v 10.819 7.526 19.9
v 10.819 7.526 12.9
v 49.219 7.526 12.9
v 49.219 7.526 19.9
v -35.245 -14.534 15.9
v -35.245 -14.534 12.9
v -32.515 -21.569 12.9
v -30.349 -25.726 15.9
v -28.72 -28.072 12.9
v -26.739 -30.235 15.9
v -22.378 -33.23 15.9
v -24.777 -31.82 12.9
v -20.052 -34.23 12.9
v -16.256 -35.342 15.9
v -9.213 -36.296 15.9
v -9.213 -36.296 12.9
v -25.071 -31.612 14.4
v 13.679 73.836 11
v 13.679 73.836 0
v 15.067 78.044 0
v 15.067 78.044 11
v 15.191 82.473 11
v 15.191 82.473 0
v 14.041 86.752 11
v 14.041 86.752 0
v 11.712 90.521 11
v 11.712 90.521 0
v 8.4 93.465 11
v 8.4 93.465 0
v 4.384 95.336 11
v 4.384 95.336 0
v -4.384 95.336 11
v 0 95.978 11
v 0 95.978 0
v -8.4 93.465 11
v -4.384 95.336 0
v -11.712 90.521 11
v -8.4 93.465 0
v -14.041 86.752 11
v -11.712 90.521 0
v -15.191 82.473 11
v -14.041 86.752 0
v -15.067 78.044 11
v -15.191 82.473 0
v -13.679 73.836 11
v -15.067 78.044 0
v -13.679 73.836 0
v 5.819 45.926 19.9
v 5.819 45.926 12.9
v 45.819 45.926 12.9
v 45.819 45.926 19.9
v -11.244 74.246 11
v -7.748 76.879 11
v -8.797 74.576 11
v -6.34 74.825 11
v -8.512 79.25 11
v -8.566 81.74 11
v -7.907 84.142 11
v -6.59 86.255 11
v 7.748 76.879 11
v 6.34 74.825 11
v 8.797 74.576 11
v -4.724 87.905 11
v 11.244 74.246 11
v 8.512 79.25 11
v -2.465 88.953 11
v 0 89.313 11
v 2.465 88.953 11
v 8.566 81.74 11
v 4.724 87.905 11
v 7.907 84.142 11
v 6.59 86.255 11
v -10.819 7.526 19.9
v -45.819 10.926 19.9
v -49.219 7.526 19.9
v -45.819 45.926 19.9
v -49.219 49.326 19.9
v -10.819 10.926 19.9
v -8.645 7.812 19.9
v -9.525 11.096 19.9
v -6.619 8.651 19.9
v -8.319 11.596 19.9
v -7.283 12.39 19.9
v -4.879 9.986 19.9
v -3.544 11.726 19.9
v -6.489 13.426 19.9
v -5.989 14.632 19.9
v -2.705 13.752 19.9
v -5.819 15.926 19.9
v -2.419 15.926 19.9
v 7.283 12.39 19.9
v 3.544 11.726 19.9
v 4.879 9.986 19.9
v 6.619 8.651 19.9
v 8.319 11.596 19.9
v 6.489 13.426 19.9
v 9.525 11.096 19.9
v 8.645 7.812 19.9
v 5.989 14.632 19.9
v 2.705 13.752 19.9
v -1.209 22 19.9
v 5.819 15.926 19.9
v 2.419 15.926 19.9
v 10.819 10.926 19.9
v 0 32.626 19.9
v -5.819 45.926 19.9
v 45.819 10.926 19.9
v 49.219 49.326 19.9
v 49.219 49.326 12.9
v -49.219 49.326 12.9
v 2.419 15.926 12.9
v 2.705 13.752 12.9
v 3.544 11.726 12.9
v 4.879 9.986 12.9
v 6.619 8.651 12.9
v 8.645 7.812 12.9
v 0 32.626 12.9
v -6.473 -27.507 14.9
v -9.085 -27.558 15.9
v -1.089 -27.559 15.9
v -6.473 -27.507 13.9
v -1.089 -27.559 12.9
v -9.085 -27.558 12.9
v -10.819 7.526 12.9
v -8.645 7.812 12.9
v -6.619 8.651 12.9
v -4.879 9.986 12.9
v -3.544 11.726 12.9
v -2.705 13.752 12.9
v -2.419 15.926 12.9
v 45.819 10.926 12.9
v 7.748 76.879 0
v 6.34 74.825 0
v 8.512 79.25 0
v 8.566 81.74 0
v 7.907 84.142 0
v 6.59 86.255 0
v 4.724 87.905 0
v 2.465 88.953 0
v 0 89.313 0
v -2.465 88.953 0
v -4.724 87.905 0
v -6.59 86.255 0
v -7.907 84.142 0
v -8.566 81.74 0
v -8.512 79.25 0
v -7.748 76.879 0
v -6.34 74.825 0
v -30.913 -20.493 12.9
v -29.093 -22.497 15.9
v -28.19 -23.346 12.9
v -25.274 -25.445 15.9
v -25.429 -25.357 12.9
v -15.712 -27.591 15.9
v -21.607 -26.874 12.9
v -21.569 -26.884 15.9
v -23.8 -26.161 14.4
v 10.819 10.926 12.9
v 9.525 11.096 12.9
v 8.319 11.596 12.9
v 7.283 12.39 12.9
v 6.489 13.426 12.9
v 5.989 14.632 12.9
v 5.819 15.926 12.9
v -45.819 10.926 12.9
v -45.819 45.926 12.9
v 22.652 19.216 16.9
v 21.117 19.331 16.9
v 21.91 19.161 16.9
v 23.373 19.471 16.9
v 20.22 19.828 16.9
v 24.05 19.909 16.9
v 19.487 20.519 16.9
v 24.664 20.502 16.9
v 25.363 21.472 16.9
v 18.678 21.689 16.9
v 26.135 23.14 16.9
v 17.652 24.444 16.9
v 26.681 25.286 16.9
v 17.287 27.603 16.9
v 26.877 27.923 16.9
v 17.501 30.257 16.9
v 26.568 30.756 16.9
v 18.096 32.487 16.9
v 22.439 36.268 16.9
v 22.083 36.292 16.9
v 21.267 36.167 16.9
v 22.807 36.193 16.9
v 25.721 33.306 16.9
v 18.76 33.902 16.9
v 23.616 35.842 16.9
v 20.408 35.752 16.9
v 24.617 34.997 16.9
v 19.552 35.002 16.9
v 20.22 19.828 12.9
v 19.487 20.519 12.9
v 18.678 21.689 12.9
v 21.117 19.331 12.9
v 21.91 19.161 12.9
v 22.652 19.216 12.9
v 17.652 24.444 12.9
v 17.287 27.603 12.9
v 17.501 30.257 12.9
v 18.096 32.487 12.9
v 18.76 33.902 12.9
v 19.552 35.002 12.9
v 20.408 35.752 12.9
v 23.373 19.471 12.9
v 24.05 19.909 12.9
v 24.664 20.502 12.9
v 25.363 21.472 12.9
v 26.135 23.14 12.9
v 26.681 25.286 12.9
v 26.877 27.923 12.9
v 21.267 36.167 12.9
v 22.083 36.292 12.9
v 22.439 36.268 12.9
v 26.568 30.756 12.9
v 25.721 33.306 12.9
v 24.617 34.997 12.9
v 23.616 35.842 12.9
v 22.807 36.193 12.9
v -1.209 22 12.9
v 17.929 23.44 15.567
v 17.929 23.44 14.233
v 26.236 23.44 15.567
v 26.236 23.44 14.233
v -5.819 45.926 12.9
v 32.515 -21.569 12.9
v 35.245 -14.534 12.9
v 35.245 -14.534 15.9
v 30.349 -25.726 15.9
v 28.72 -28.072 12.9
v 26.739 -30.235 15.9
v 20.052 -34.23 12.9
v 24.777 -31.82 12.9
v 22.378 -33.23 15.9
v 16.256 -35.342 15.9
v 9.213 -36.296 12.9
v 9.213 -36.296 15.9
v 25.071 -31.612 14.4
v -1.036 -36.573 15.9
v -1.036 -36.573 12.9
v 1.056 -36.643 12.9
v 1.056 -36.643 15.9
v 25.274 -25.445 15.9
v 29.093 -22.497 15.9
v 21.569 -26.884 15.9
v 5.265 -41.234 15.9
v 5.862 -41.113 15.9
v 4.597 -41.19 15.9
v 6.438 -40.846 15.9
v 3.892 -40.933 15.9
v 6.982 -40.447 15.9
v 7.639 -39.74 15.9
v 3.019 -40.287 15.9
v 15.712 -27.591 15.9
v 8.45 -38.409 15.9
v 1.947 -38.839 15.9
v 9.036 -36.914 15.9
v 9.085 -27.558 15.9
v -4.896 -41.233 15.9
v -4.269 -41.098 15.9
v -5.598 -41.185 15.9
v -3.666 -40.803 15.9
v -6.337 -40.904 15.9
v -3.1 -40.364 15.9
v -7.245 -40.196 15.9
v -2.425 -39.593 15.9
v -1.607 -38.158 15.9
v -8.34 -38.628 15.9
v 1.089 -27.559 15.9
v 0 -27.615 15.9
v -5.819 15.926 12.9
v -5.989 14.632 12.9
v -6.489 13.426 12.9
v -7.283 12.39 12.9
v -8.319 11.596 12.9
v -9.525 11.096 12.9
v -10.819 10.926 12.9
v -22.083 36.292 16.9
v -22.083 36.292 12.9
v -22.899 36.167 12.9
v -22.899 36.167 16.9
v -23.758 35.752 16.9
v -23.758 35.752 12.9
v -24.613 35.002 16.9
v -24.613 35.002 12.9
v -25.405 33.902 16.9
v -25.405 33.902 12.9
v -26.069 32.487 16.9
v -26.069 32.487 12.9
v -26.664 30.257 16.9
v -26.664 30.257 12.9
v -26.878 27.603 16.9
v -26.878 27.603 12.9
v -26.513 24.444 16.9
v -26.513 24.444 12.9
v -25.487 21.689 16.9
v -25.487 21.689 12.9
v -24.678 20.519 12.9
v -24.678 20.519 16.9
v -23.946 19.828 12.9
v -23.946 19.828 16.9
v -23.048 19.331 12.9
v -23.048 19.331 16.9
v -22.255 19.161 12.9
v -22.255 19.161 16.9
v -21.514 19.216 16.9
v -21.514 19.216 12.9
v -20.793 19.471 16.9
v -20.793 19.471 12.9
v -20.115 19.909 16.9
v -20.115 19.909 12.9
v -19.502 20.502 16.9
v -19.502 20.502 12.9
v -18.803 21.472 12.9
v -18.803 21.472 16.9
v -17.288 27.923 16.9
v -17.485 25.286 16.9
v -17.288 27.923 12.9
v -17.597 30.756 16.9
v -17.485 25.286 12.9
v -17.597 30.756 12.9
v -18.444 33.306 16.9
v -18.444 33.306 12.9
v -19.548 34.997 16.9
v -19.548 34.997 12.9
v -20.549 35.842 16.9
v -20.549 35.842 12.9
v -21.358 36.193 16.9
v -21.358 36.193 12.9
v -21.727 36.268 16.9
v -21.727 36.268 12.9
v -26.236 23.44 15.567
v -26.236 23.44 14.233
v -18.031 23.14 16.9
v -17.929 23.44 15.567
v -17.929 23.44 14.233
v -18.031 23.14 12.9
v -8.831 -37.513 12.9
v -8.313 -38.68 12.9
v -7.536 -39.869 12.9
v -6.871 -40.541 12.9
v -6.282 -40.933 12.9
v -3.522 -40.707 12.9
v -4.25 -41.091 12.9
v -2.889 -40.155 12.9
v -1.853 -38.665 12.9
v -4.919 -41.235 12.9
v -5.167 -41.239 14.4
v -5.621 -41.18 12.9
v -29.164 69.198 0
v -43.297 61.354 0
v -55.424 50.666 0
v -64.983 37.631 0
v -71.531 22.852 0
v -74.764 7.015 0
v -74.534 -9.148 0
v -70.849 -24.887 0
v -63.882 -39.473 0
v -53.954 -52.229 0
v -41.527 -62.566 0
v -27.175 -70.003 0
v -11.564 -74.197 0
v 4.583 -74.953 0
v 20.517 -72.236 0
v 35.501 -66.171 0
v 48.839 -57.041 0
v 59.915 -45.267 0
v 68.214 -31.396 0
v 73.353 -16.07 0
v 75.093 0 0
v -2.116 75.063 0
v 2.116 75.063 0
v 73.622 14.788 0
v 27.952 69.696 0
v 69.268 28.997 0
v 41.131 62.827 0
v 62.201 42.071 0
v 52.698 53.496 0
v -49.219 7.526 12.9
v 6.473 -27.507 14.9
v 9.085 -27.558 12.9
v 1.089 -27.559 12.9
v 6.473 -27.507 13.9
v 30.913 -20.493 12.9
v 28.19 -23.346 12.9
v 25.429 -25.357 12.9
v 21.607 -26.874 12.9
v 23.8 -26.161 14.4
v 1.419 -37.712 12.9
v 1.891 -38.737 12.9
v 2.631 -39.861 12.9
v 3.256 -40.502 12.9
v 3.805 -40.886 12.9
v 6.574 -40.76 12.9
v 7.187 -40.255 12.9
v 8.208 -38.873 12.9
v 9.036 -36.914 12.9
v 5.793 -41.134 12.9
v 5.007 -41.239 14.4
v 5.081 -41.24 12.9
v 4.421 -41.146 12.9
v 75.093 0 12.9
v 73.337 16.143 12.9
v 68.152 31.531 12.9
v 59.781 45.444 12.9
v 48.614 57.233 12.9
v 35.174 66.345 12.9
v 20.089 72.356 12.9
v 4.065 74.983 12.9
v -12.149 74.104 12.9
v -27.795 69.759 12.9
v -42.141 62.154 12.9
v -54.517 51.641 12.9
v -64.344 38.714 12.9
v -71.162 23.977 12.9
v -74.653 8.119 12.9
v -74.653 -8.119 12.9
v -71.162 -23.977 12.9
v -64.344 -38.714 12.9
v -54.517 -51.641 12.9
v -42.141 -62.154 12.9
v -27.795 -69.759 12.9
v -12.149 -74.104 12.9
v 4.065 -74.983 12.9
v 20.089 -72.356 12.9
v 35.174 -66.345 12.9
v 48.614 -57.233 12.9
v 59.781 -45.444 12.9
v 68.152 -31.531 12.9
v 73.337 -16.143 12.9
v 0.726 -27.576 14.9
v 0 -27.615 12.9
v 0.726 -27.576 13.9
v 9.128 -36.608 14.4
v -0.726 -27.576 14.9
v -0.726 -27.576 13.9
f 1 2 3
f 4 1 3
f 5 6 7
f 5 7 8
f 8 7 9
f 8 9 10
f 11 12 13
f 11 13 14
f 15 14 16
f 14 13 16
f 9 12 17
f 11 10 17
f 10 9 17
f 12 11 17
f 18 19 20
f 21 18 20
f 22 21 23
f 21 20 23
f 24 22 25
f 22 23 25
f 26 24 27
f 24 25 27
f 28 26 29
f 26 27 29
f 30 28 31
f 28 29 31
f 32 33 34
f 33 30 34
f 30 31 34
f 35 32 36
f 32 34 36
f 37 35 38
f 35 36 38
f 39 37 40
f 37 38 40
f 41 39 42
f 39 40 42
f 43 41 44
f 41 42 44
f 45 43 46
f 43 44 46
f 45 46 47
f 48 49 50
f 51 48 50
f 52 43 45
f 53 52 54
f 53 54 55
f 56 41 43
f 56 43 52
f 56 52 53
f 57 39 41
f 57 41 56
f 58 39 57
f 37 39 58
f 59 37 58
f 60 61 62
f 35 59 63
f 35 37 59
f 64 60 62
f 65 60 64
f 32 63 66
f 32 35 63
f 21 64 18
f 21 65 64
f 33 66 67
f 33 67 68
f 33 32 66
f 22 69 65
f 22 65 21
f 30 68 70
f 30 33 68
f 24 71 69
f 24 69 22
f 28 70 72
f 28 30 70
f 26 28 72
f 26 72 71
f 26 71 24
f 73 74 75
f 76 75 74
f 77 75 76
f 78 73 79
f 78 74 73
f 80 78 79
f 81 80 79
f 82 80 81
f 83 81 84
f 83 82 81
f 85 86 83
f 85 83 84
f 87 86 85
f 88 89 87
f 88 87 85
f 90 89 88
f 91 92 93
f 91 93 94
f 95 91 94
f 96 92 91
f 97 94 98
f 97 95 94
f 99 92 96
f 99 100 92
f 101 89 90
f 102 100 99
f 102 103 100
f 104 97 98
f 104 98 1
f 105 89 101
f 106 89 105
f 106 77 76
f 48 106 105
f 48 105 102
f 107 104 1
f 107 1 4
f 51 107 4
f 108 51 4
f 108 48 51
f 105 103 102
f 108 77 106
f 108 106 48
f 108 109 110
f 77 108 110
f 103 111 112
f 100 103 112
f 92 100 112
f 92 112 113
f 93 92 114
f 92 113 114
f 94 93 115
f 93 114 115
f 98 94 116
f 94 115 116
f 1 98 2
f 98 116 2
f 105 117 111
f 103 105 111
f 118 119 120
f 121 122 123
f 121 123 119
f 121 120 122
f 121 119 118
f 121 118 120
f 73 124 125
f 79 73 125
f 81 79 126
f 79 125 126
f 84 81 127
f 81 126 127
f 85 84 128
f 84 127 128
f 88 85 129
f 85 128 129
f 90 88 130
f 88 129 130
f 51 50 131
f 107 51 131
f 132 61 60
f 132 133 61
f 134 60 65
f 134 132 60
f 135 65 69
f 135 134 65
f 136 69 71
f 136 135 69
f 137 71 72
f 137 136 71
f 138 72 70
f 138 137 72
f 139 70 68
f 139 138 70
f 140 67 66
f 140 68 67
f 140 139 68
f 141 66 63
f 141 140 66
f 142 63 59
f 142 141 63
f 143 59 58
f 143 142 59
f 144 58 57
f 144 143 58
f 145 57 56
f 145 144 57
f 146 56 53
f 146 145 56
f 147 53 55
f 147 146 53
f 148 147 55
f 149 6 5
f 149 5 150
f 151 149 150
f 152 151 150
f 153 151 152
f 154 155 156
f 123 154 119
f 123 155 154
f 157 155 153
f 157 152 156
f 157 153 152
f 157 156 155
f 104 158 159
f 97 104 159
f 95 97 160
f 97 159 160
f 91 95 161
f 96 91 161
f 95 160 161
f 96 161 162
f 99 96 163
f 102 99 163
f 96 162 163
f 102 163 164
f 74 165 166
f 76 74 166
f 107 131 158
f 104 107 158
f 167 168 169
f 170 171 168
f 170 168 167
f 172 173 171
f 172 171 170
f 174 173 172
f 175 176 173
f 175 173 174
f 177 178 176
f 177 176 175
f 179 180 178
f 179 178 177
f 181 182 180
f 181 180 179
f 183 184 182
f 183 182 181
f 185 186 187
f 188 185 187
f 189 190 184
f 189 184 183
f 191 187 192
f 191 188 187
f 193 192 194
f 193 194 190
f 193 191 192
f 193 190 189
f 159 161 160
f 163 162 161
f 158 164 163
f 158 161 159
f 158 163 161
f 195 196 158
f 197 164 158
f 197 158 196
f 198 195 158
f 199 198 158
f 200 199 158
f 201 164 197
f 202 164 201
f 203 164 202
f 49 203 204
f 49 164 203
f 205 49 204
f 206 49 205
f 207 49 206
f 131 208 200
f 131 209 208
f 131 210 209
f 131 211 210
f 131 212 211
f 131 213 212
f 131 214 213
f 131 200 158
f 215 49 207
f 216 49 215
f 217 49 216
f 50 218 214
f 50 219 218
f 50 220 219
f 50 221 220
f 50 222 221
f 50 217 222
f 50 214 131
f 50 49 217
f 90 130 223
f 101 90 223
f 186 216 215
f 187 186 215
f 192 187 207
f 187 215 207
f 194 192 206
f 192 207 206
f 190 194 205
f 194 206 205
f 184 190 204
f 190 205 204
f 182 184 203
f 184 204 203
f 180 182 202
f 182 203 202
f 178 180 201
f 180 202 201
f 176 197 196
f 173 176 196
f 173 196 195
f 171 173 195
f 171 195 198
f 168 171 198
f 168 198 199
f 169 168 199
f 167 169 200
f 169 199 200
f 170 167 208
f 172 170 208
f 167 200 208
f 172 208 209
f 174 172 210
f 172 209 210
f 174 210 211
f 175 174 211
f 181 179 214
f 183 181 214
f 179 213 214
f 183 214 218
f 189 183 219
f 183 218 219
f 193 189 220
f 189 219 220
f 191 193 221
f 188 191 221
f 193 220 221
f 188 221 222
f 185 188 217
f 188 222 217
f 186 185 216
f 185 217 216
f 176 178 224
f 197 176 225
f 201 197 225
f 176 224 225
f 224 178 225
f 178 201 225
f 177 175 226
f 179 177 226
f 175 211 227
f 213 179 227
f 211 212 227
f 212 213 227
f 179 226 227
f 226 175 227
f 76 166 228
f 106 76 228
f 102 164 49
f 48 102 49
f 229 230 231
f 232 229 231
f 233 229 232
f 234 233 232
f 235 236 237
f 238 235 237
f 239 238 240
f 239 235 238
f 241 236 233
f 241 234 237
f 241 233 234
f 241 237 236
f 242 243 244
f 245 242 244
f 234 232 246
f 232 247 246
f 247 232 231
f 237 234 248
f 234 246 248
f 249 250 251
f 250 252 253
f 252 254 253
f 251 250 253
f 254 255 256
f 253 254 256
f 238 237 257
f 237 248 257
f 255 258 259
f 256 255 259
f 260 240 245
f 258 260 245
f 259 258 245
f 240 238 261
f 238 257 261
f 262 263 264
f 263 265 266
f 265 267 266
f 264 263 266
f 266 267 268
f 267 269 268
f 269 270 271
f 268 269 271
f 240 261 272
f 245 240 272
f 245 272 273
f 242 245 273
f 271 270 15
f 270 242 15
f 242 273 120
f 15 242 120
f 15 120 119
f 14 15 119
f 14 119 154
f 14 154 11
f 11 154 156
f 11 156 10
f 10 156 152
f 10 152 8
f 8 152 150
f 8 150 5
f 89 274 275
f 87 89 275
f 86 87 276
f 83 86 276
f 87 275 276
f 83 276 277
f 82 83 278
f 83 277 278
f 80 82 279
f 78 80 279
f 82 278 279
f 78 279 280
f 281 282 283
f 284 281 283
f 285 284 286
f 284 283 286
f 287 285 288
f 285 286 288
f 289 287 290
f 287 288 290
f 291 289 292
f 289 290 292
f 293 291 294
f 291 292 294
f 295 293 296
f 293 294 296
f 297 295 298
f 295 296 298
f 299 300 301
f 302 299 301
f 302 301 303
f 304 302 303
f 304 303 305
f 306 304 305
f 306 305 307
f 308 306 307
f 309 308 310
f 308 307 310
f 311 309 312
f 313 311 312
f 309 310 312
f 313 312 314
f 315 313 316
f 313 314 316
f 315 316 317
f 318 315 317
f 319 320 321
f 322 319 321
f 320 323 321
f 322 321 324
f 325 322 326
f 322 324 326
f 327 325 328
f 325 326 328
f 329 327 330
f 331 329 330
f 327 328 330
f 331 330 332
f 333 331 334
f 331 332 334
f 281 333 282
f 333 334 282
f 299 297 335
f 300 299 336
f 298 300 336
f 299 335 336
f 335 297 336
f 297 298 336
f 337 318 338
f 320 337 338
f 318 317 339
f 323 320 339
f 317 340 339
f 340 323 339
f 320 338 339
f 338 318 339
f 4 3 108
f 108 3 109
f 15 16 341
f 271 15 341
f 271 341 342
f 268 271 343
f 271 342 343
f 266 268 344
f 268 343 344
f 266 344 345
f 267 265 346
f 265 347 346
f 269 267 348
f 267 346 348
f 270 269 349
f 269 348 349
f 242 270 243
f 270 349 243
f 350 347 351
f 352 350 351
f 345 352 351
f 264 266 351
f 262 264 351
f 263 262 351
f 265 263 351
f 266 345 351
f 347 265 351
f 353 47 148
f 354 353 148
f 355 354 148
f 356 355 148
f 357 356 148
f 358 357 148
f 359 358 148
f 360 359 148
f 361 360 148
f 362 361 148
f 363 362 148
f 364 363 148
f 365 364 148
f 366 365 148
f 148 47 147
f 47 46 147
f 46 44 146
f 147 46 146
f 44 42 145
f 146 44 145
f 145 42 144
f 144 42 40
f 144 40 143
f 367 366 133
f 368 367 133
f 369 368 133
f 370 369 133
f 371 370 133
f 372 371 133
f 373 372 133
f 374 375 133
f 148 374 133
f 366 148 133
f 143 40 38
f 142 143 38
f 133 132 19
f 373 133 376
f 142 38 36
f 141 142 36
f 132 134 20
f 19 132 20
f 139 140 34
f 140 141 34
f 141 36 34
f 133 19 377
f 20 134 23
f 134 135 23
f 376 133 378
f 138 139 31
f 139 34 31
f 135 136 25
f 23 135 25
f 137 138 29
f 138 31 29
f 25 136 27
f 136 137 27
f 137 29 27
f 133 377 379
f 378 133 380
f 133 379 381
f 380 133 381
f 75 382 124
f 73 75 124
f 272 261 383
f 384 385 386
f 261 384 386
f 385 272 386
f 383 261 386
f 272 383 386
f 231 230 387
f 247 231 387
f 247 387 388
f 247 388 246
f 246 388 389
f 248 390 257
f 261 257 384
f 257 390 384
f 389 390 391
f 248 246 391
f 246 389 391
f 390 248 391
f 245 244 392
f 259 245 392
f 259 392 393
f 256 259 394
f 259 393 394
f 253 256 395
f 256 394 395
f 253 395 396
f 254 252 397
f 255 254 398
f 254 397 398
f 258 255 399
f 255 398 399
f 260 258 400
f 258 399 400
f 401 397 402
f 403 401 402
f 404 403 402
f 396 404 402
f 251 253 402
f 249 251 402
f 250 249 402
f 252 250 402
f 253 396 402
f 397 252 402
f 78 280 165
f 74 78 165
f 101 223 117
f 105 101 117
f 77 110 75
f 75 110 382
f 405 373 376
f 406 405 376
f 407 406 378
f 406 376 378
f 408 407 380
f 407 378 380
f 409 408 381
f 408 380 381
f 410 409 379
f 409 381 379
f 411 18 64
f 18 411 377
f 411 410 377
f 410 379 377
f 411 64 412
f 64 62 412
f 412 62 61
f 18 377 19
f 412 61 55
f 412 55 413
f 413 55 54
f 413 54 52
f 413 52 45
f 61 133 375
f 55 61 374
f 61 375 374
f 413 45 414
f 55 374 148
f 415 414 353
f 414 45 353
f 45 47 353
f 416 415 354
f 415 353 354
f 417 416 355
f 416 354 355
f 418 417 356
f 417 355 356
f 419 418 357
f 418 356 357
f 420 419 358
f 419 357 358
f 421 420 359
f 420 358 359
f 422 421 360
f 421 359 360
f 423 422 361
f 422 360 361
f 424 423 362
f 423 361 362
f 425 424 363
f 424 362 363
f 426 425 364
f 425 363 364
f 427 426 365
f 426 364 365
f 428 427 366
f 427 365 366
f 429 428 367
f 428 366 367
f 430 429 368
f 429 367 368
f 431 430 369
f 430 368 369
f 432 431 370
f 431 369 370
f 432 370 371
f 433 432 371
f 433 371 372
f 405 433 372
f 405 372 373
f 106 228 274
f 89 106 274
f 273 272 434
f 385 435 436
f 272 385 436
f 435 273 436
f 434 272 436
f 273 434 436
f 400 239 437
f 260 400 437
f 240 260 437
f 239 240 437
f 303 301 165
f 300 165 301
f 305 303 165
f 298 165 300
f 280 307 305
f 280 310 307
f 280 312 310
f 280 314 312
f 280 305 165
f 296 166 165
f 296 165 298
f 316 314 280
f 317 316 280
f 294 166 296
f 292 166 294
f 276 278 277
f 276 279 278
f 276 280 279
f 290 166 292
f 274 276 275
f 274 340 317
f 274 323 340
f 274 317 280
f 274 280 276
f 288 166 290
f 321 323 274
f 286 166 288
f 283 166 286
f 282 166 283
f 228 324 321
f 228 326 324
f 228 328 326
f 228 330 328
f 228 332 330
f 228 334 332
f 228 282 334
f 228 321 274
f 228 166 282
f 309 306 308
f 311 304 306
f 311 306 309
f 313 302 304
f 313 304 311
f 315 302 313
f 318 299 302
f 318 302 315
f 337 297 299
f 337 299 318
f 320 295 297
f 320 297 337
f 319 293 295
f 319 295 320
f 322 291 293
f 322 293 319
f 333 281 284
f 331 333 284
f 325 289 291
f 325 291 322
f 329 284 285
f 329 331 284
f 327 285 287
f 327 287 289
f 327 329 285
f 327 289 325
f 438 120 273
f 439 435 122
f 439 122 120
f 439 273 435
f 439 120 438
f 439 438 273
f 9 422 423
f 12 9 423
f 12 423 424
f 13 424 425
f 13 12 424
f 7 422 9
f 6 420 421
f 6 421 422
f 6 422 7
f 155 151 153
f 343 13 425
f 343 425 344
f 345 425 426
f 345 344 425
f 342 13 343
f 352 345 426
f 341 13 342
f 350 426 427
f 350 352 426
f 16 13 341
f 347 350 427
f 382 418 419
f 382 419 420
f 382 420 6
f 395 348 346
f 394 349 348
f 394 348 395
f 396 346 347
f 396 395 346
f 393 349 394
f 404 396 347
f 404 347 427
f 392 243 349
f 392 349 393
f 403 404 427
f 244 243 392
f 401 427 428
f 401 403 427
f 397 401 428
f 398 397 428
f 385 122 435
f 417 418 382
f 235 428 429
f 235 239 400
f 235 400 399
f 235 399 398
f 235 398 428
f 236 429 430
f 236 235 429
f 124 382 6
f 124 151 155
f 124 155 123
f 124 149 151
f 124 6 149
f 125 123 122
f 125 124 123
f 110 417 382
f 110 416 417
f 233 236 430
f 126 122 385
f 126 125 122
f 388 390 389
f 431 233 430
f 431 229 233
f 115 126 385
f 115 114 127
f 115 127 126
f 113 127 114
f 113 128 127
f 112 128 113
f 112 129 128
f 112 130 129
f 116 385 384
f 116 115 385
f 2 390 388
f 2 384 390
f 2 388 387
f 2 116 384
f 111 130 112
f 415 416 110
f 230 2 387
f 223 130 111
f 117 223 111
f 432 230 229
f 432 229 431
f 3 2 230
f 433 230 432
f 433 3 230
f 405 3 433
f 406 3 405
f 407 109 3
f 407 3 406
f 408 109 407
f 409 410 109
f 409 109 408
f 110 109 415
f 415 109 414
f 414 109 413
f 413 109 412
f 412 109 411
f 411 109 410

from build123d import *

# Parameters (mm, degrees)
F0_R     = 75.0928281094
F2_DEPTH = 12.9
F3_DEPTH = 15.9
F5_DEPTH = 4
F6_R     = 15.2965579627
F6_R_2   = 8.6311016996
F7_DEPTH = 11
F9_DEPTH = 7


with BuildPart() as f2:
    # F0 (on Top) → F2 (new body)
    with BuildSketch(Plane.XY):
        Circle(F0_R)
    extrude(amount=F2_DEPTH)

    # F1 (on face) → F3 (join)
    with BuildSketch(Plane.XY):
        with BuildLine():
            add(Edge.make_bspline(
                [(-35.2451838553, -14.5340962335), (-32.0518207836, -19.1964482892), (-26.2372639575, -27.9738789108), (-14.7014562583, -27.6842216687), (-9.08471609, -27.5584450171)],
                knots=[0, 0, 0, 0, 0.4527149803, 0.8127890997, 0.8127890997, 0.8127890997, 0.8127890997], degree=3))
            add(Edge.make_bspline(
                [(-35.2451838553, -14.5340962335), (-32.8115077506, -21.3914317712), (-28.4404924532, -32.6892135381), (-15.405757475, -35.9303240461), (-9.2133200428, -36.2957460358)],
                knots=[0, 0, 0, 0, 0.4690101989, 0.827322276, 0.827322276, 0.827322276, 0.827322276], degree=3))
            add(Edge.make_bspline(
                [(-9.08471609, -27.5584450171), (-10.3725503531, -31.8579406773), (-9.2133200428, -36.2957460358)],
                knots=[1.0400212004, 1.0400212004, 1.0400212004, 2.0439012187, 2.0439012187, 2.0439012187], degree=2, weights=[1, 0.8766508211, 1]))
        make_face()
        with BuildLine():
            add(Edge.make_bspline(
                [(-9.08471609, -27.5584450171), (-10.3725503531, -31.8579406773), (-9.2133200428, -36.2957460358)],
                knots=[1.0400212004, 1.0400212004, 1.0400212004, 2.0439012187, 2.0439012187, 2.0439012187], degree=2, weights=[1, 0.8766508211, 1]))
            add(Edge.make_bspline(
                [(-9.2133200428, -36.2957460358), (-6.5297495568, -36.4541062417), (-3.7434296225, -36.417470813), (-0.9420935331, -36.2243297496)],
                knots=[0.827322276, 0.827322276, 0.827322276, 0.827322276, 0.9826013119, 0.9826013119, 0.9826013119, 0.9826013119], degree=3))
            add(Edge.make_bspline(
                [(-0.9420935331, -36.2243297496), (0.1851268686, -31.8136655998), (-1.0889131788, -27.559237201)],
                knots=[4.2480963919, 4.2480963919, 4.2480963919, 5.2430629887, 5.2430629887, 5.2430629887], degree=2, weights=[1, 0.8787863524, 1]))
            add(Edge.make_bspline(
                [(-9.08471609, -27.5584450171), (-6.5062543312, -27.5007050689), (-3.8211027643, -27.4435013669), (-1.0889131788, -27.559237201)],
                knots=[0.8127890997, 0.8127890997, 0.8127890997, 0.8127890997, 0.9780873545, 0.9780873545, 0.9780873545, 0.9780873545], degree=3))
        make_face()
        with BuildLine():
            add(Edge.make_bspline(
                [(-9.2133200428, -36.2957460358), (-6.5297495568, -36.4541062417), (-3.7434296225, -36.417470813), (-0.9420935331, -36.2243297496)],
                knots=[0.827322276, 0.827322276, 0.827322276, 0.827322276, 0.9826013119, 0.9826013119, 0.9826013119, 0.9826013119], degree=3))
            add(Edge.make_bspline(
                [(-9.2133200428, -36.2957460358), (-5.2569763, -51.441557274), (-1.035979555, -36.5726214568)],
                knots=[2.0439012187, 2.0439012187, 2.0439012187, 4.204730432, 4.204730432, 4.204730432], degree=2, weights=[1, 0.4709626581, 1]))
            add(Edge.make_bspline(
                [(-1.035979555, -36.5726214568), (-0.9871093073, -36.4004705121), (-0.9420935331, -36.2243297496)],
                knots=[4.204730432, 4.204730432, 4.204730432, 4.2480963919, 4.2480963919, 4.2480963919], degree=2, weights=[1, 0.9997649334, 1]))
        make_face()
        with BuildLine():
            add(Edge.make_bspline(
                [(-0.9420935331, -36.2243297496), (0.1851268686, -31.8136655998), (-1.0889131788, -27.559237201)],
                knots=[4.2480963919, 4.2480963919, 4.2480963919, 5.2430629887, 5.2430629887, 5.2430629887], degree=2, weights=[1, 0.8787863524, 1]))
            add(Edge.make_bspline(
                [(-0.9420935331, -36.2243297496), (-0.6282097401, -36.2026887014), (-0.3141374234, -36.1790827672), (0, -36.1535660923)],
                knots=[0.9826013119, 0.9826013119, 0.9826013119, 0.9826013119, 1, 1, 1, 1], degree=3))
            add(Edge.make_bspline(
                [(0.9420935331, -36.2243297496), (0.6282097401, -36.2026887014), (0.3141374234, -36.1790827672), (0, -36.1535660923)],
                knots=[0.9826013119, 0.9826013119, 0.9826013119, 0.9826013119, 1, 1, 1, 1], degree=3))
            add(Edge.make_bspline(
                [(1.0889131788, -27.559237201), (-0.1851268686, -31.8136655998), (0.9420935331, -36.2243297496)],
                knots=[1.0401223185, 1.0401223185, 1.0401223185, 2.0350889153, 2.0350889153, 2.0350889153], degree=2, weights=[1, 0.8787863524, 1]))
            add(Edge.make_bspline(
                [(1.0889131788, -27.559237201), (0.7267224105, -27.5745796394), (0.3637050295, -27.5929611946), (0, -27.6147834957)],
                knots=[0.9780873545, 0.9780873545, 0.9780873545, 0.9780873545, 1, 1, 1, 1], degree=3))
            add(Edge.make_bspline(
                [(-1.0889131788, -27.559237201), (-0.7267224105, -27.5745796394), (-0.3637050295, -27.5929611946), (0, -27.6147834957)],
                knots=[0.9780873545, 0.9780873545, 0.9780873545, 0.9780873545, 1, 1, 1, 1], degree=3))
        make_face()
        with BuildLine():
            add(Edge.make_bspline(
                [(-0.9420935331, -36.2243297496), (-0.6282097401, -36.2026887014), (-0.3141374234, -36.1790827672), (0, -36.1535660923)],
                knots=[0.9826013119, 0.9826013119, 0.9826013119, 0.9826013119, 1, 1, 1, 1], degree=3))
            add(Edge.make_bspline(
                [(-1.035979555, -36.5726214568), (-0.9871093073, -36.4004705121), (-0.9420935331, -36.2243297496)],
                knots=[4.204730432, 4.204730432, 4.204730432, 4.2480963919, 4.2480963919, 4.2480963919], degree=2, weights=[1, 0.9997649334, 1]))
            Line((-1.035979555, -36.5726214568), (1.0563025697, -36.6434637429))
            add(Edge.make_bspline(
                [(0.9420935331, -36.2243297496), (0.9964001473, -36.4368243386), (1.0563025697, -36.6434637429)],
                knots=[2.0350889153, 2.0350889153, 2.0350889153, 2.087401476, 2.087401476, 2.087401476], degree=2, weights=[1, 0.999657944, 1]))
            add(Edge.make_bspline(
                [(0.9420935331, -36.2243297496), (0.6282097401, -36.2026887014), (0.3141374234, -36.1790827672), (0, -36.1535660923)],
                knots=[0.9826013119, 0.9826013119, 0.9826013119, 0.9826013119, 1, 1, 1, 1], degree=3))
        make_face()
        with BuildLine():
            add(Edge.make_bspline(
                [(0.9420935331, -36.2243297496), (0.9964001473, -36.4368243386), (1.0563025697, -36.6434637429)],
                knots=[2.0350889153, 2.0350889153, 2.0350889153, 2.087401476, 2.087401476, 2.087401476], degree=2, weights=[1, 0.999657944, 1]))
            add(Edge.make_bspline(
                [(1.0563025697, -36.6434637429), (4.92956003, -50.0046531742), (9.036057917, -36.9136491564)],
                knots=[2.087401476, 2.087401476, 2.087401476, 4.1612301746, 4.1612301746, 4.1612301746], degree=2, weights=[1, 0.5088789213, 1]))
            add(Edge.make_bspline(
                [(9.036057917, -36.9136491564), (9.1308451493, -36.6114792608), (9.2133200428, -36.2957460358)],
                knots=[4.1612301746, 4.1612301746, 4.1612301746, 4.2392840885, 4.2392840885, 4.2392840885], degree=2, weights=[1, 0.999238545, 1]))
            add(Edge.make_bspline(
                [(9.2133200428, -36.2957460358), (6.5297495568, -36.4541062417), (3.7434296225, -36.417470813), (0.9420935331, -36.2243297496)],
                knots=[0.827322276, 0.827322276, 0.827322276, 0.827322276, 0.9826013119, 0.9826013119, 0.9826013119, 0.9826013119], degree=3))
        make_face()
        with BuildLine():
            add(Edge.make_bspline(
                [(1.0889131788, -27.559237201), (-0.1851268686, -31.8136655998), (0.9420935331, -36.2243297496)],
                knots=[1.0401223185, 1.0401223185, 1.0401223185, 2.0350889153, 2.0350889153, 2.0350889153], degree=2, weights=[1, 0.8787863524, 1]))
            add(Edge.make_bspline(
                [(9.2133200428, -36.2957460358), (6.5297495568, -36.4541062417), (3.7434296225, -36.417470813), (0.9420935331, -36.2243297496)],
                knots=[0.827322276, 0.827322276, 0.827322276, 0.827322276, 0.9826013119, 0.9826013119, 0.9826013119, 0.9826013119], degree=3))
            add(Edge.make_bspline(
                [(9.2133200428, -36.2957460358), (10.3725503531, -31.8579406773), (9.08471609, -27.5584450171)],
                knots=[4.2392840885, 4.2392840885, 4.2392840885, 5.2431641067, 5.2431641067, 5.2431641067], degree=2, weights=[1, 0.8766508211, 1]))
            add(Edge.make_bspline(
                [(9.08471609, -27.5584450171), (6.5062543312, -27.5007050689), (3.8211027643, -27.4435013669), (1.0889131788, -27.559237201)],
                knots=[0.8127890997, 0.8127890997, 0.8127890997, 0.8127890997, 0.9780873545, 0.9780873545, 0.9780873545, 0.9780873545], degree=3))
        make_face()
        with BuildLine():
            add(Edge.make_bspline(
                [(9.2133200428, -36.2957460358), (10.3725503531, -31.8579406773), (9.08471609, -27.5584450171)],
                knots=[4.2392840885, 4.2392840885, 4.2392840885, 5.2431641067, 5.2431641067, 5.2431641067], degree=2, weights=[1, 0.8766508211, 1]))
            add(Edge.make_bspline(
                [(35.2451838553, -14.5340962335), (32.8115077506, -21.3914317712), (28.4404924532, -32.6892135381), (15.405757475, -35.9303240461), (9.2133200428, -36.2957460358)],
                knots=[0, 0, 0, 0, 0.4690101989, 0.827322276, 0.827322276, 0.827322276, 0.827322276], degree=3))
            add(Edge.make_bspline(
                [(35.2451838553, -14.5340962335), (32.0518207836, -19.1964482892), (26.2372639575, -27.9738789108), (14.7014562583, -27.6842216687), (9.08471609, -27.5584450171)],
                knots=[0, 0, 0, 0, 0.4527149803, 0.8127890997, 0.8127890997, 0.8127890997, 0.8127890997], degree=3))
        make_face()
    extrude(amount=F3_DEPTH)

    # F4 (on face) → F5 (join)
    with BuildSketch(Plane.XY.offset(12.9)):
        with BuildLine():
            add(Edge.make_bspline(
                [(-22.082677111, 36.2915284932), (-30.3896638277, 36.2915284932), (-26.2361704694, 23.4395088628), (-22.082677111, 10.5874892324), (-17.9291837527, 23.4395088628), (-13.7756903943, 36.2915284932), (-22.082677111, 36.2915284932)],
                knots=[0, 0, 0, 2.0943951024, 2.0943951024, 4.1887902048, 4.1887902048, 6.2831853072, 6.2831853072, 6.2831853072], degree=2, weights=[1, 0.5, 1, 0.5, 1, 0.5, 1]))
        make_face()
        with BuildLine():
            add(Edge.make_bspline(
                [(22.082677111, 36.2915284932), (13.7756903943, 36.2915284932), (17.9291837527, 23.4395088628), (22.082677111, 10.5874892324), (26.2361704694, 23.4395088628), (30.3896638277, 36.2915284932), (22.082677111, 36.2915284932)],
                knots=[0, 0, 0, 2.0943951024, 2.0943951024, 4.1887902048, 4.1887902048, 6.2831853072, 6.2831853072, 6.2831853072], degree=2, weights=[1, 0.5, 1, 0.5, 1, 0.5, 1]))
        make_face()
    extrude(amount=F5_DEPTH)

    # F6 (on Top) → F7 (join)
    with BuildSketch(Plane.XY):
        with Locations((0, 80.6815698743)):
            Circle(F6_R)
        with Locations((0, 80.6815698743)):
            Circle(F6_R_2, mode=Mode.SUBTRACT)
    extrude(amount=F7_DEPTH)

    # F8 (on face) → F9 (join)
    with BuildSketch(Plane.XY.offset(12.9)):
        with BuildLine():
            Line((-2.4189469405, 49.3257313765), (-49.2189481235, 49.3257313765))
            Line((-49.2189481235, 49.3257313765), (-49.2189481235, 7.5257301935))
            Line((-49.2189481235, 7.5257301935), (-10.818947532, 7.5257301935))
            ThreePointArc((-10.818947532, 7.5257301935), (-4.8792501517, 9.9860334048), (-2.4189469405, 15.925730785))
            Line((-2.4189469405, 15.925730785), (-1.2094734702, 22.000117611))
            Line((-1.2094734702, 22.000117611), (0, 32.6257310808))
            Line((0, 32.6257310808), (2.4189469405, 15.925730785))
            ThreePointArc((2.4189469405, 15.925730785), (4.8792501517, 9.9860334048), (10.818947532, 7.5257301935))
            Line((10.818947532, 7.5257301935), (49.2189481235, 7.5257301935))
            Line((49.2189481235, 7.5257301935), (49.2189481235, 49.3257313765))
            Line((49.2189481235, 49.3257313765), (2.4189469405, 49.3257313765))
            Line((2.4189469405, 49.3257313765), (-2.4189469405, 49.3257313765))
        make_face()
        with BuildLine():
            Line((-45.818947532, 10.925730785), (-45.818947532, 45.925730785))
            Line((-45.818947532, 45.925730785), (-5.818947532, 45.925730785))
            Line((-5.818947532, 45.925730785), (-5.818947532, 15.925730785))
            ThreePointArc((-5.818947532, 15.925730785), (-7.2834136261, 12.3901968791), (-10.818947532, 10.925730785))
            Line((-10.818947532, 10.925730785), (-45.818947532, 10.925730785))
        make_face(mode=Mode.SUBTRACT)
        with BuildLine():
            Line((5.818947532, 15.925730785), (5.818947532, 45.925730785))
            Line((5.818947532, 45.925730785), (45.818947532, 45.925730785))
            Line((45.818947532, 45.925730785), (45.818947532, 10.925730785))
            Line((45.818947532, 10.925730785), (10.818947532, 10.925730785))
            ThreePointArc((10.818947532, 10.925730785), (7.2834136261, 12.3901968791), (5.818947532, 15.925730785))
        make_face(mode=Mode.SUBTRACT)
    extrude(amount=F9_DEPTH)


solid = f2.part
